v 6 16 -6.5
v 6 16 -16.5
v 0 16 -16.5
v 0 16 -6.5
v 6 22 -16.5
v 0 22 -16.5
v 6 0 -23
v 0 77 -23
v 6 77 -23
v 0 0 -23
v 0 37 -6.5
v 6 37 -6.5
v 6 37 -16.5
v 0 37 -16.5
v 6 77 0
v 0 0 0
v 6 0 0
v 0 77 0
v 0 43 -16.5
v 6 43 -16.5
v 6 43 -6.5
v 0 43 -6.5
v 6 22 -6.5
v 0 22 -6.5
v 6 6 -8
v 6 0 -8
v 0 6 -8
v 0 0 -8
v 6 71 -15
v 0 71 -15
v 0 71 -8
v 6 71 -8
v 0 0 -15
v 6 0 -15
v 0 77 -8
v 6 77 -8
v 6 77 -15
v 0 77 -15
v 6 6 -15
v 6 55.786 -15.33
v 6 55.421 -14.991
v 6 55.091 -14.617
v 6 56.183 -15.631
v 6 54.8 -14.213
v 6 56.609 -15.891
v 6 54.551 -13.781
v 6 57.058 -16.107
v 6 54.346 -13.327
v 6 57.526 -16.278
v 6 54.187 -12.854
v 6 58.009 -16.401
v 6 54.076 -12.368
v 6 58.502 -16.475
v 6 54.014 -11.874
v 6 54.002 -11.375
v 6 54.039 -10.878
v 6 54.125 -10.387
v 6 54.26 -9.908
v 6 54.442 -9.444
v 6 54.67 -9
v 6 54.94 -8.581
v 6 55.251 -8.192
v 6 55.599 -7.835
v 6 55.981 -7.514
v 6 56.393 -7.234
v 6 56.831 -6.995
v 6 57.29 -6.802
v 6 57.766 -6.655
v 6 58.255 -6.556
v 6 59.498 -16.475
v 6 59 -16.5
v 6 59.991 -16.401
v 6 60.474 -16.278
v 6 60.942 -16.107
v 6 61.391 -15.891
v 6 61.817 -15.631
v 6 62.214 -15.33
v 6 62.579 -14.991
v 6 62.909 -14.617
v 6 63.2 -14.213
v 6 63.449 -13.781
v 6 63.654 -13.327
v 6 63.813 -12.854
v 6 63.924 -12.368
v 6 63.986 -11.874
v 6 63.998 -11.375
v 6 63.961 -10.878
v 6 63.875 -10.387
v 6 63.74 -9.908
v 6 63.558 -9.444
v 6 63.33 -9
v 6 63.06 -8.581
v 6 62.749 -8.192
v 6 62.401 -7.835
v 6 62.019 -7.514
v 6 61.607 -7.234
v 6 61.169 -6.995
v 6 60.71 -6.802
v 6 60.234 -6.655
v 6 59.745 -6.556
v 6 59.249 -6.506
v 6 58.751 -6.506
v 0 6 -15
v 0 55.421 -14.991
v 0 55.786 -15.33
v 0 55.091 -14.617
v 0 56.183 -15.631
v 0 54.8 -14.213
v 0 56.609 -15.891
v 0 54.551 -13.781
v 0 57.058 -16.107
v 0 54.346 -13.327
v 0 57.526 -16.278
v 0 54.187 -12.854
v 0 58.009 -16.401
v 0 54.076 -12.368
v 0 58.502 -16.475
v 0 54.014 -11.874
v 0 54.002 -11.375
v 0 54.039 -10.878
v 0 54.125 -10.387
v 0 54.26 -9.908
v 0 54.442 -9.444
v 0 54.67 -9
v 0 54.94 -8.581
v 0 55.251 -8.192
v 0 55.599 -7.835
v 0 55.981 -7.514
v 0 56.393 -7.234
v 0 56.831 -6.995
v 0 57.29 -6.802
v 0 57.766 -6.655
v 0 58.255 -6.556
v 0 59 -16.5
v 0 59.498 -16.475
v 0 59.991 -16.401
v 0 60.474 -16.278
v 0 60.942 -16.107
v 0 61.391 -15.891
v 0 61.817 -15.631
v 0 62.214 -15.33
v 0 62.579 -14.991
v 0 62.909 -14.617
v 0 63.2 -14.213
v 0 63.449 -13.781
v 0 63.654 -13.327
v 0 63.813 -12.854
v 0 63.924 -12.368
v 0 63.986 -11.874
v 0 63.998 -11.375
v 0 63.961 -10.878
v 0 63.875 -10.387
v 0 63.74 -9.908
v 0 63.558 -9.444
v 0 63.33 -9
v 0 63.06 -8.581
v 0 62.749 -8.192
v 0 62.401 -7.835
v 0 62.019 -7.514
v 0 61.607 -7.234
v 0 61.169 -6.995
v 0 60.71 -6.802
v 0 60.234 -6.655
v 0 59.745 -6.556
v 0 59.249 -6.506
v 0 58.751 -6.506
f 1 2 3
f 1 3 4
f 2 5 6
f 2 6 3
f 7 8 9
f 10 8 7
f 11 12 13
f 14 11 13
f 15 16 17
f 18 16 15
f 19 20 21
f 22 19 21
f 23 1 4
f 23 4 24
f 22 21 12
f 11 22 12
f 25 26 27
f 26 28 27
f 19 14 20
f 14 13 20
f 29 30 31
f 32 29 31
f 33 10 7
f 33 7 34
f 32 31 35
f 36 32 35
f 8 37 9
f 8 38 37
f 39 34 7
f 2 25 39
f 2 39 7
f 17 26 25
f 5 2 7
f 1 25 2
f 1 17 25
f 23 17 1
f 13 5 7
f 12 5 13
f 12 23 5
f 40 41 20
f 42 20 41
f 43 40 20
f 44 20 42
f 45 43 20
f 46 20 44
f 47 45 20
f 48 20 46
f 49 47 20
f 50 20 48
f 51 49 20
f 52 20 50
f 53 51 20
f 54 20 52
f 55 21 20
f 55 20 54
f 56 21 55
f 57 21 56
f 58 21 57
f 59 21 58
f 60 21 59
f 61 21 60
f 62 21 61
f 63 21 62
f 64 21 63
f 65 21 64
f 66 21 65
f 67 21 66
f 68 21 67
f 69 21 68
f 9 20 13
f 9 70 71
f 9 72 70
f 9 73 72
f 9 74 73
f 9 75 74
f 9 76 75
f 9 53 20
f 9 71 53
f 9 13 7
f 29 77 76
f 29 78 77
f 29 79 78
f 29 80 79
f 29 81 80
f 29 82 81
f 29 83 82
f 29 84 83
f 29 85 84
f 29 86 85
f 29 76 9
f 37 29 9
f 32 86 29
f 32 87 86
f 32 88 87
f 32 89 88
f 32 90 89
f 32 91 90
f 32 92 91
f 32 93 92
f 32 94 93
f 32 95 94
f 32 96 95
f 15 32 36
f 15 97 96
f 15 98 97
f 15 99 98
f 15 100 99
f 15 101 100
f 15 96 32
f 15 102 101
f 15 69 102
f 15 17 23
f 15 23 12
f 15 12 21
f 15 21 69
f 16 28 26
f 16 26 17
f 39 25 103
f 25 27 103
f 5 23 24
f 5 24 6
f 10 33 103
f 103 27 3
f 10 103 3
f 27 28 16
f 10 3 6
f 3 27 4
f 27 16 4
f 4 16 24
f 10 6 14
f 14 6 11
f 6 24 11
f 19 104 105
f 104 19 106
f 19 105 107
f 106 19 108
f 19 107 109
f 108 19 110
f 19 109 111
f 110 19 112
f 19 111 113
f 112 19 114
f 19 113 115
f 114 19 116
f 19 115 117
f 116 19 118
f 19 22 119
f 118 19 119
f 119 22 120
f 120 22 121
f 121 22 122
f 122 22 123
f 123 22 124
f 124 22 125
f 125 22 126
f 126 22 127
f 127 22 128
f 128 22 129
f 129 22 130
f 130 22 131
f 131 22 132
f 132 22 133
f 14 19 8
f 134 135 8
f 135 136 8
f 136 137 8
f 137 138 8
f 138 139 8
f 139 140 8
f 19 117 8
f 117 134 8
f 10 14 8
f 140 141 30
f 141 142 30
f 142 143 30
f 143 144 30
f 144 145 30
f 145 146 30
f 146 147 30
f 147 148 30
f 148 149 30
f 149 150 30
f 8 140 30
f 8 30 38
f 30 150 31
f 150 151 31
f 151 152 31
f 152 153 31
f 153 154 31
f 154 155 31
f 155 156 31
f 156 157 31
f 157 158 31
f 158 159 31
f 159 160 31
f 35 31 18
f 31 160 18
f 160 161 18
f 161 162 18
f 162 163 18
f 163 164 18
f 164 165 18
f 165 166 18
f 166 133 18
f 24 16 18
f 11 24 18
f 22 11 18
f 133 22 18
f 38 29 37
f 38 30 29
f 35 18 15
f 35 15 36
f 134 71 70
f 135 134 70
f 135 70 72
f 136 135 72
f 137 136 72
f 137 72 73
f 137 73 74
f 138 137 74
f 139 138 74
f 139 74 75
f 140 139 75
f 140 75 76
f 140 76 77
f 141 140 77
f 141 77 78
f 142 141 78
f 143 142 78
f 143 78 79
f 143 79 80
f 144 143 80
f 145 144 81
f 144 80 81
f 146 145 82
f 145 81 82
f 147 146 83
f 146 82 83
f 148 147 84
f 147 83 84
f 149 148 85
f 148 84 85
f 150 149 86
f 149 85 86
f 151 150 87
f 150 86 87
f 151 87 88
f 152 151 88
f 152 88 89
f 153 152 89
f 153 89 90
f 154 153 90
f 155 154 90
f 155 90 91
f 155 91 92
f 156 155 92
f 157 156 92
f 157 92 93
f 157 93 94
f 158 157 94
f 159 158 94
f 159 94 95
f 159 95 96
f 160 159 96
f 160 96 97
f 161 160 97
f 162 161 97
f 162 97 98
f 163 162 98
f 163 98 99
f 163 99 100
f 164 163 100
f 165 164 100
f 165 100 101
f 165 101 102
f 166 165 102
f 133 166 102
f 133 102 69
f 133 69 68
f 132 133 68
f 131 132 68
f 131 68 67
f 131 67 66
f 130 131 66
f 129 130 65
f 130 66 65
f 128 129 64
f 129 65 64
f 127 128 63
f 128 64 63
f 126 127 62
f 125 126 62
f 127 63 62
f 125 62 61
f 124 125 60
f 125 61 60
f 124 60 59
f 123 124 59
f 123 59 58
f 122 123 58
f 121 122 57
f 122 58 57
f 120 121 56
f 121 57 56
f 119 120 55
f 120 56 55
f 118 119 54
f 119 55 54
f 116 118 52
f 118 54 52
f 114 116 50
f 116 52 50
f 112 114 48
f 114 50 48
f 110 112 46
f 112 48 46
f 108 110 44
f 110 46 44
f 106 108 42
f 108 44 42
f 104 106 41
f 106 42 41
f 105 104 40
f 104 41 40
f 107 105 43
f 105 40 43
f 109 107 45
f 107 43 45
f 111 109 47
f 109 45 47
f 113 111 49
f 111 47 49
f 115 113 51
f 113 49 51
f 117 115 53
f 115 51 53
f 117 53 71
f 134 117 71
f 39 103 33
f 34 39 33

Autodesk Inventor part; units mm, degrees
ref_plane "YZ Plane" through (0, 0, 0) normal (1, 0, 0) x (0, 1, 0)
ref_plane "XZ Plane" through (0, 0, 0) normal (0, 1, 0) x (-1, 0, 0)
ref_plane "XY Plane" through (0, 0, 0) normal (0, 0, 1) x (1, 0, 0)
sketch "Sketch1" plane through (0, 0, 0) normal (1, 0, 0) x (0, 1, 0)
  line L0 (0, 0) -> (77, 0)
  line L1 (77, 0) -> (77, -23)
  line L2 (77, -23) -> (0, -23)
  line L3 (0, -23) -> (0, 0)
  line L4 (71, -11.5) -> (71, -8)
  line L5 (71, -8) -> (71, -15)
  line L6 (71, -15) -> (77, -15)
  line L7 (71, -8) -> (77, -8)
  line L8 (0, -8) -> (6, -8)
  line L9 (6, -8) -> (6, -15)
  line L10 (6, -15) -> (0, -15)
  circle A0 centre (59, -11.5) radius 5
  dimension "d0" = 77
  dimension "d1" = 23
  dimension "d3" = 3.5
  dimension "d4" = 7
  dimension "d5" = 6
  dimension "d6" = 7
  dimension "d10" = 10
extrude "Extrusion1" add sketch "Sketch1" along normal blind 6 contours L0 L1 L7 L4 L5 L6 L2 L3 L10 L9 L8 | A0
sketch "Sketch2" plane through (6, 0, 0) normal (1, 0, 0) x (0, 0, -1)
  line L0 (15, 71) -> (8, 71) projected
  circle A0 centre (11.5, 59) radius 5
  point P0 (0, 0)
  dimension "d12" = 10
extrude "Extrusion2" cut sketch "Sketch2" against normal blind 6
sketch "Sketch3" plane through (6, 0, 0) normal (1, 0, 0) x (0, 0, -1)
  line L0 (8, 6) -> (15, 6) projected
  line L1 (11.5, 16) -> (6.5, 16)
  line L2 (6.5, 16) -> (6.5, 22)
  line L3 (6.5, 22) -> (16.5, 22)
  line L4 (16.5, 22) -> (16.5, 16)
  line L5 (16.5, 16) -> (11.5, 16)
  line L6 (11.5, 37) -> (16.5, 37)
  line L7 (16.5, 37) -> (16.5, 43)
  line L8 (16.5, 43) -> (6.5, 43)
  line L9 (6.5, 43) -> (6.5, 37)
  line L10 (6.5, 37) -> (11.5, 37)
  point P0 (0, 0)
  dimension "d16" = 5
  dimension "d17" = 6
  dimension "d18" = 10
  dimension "d19" = 6
  dimension "d21" = 5
  dimension "d22" = 6
  dimension "d23" = 10
  dimension "d24" = 6
extrude "Extrusion3" cut sketch "Sketch3" against normal blind 6
properties part number "g_arm3"
